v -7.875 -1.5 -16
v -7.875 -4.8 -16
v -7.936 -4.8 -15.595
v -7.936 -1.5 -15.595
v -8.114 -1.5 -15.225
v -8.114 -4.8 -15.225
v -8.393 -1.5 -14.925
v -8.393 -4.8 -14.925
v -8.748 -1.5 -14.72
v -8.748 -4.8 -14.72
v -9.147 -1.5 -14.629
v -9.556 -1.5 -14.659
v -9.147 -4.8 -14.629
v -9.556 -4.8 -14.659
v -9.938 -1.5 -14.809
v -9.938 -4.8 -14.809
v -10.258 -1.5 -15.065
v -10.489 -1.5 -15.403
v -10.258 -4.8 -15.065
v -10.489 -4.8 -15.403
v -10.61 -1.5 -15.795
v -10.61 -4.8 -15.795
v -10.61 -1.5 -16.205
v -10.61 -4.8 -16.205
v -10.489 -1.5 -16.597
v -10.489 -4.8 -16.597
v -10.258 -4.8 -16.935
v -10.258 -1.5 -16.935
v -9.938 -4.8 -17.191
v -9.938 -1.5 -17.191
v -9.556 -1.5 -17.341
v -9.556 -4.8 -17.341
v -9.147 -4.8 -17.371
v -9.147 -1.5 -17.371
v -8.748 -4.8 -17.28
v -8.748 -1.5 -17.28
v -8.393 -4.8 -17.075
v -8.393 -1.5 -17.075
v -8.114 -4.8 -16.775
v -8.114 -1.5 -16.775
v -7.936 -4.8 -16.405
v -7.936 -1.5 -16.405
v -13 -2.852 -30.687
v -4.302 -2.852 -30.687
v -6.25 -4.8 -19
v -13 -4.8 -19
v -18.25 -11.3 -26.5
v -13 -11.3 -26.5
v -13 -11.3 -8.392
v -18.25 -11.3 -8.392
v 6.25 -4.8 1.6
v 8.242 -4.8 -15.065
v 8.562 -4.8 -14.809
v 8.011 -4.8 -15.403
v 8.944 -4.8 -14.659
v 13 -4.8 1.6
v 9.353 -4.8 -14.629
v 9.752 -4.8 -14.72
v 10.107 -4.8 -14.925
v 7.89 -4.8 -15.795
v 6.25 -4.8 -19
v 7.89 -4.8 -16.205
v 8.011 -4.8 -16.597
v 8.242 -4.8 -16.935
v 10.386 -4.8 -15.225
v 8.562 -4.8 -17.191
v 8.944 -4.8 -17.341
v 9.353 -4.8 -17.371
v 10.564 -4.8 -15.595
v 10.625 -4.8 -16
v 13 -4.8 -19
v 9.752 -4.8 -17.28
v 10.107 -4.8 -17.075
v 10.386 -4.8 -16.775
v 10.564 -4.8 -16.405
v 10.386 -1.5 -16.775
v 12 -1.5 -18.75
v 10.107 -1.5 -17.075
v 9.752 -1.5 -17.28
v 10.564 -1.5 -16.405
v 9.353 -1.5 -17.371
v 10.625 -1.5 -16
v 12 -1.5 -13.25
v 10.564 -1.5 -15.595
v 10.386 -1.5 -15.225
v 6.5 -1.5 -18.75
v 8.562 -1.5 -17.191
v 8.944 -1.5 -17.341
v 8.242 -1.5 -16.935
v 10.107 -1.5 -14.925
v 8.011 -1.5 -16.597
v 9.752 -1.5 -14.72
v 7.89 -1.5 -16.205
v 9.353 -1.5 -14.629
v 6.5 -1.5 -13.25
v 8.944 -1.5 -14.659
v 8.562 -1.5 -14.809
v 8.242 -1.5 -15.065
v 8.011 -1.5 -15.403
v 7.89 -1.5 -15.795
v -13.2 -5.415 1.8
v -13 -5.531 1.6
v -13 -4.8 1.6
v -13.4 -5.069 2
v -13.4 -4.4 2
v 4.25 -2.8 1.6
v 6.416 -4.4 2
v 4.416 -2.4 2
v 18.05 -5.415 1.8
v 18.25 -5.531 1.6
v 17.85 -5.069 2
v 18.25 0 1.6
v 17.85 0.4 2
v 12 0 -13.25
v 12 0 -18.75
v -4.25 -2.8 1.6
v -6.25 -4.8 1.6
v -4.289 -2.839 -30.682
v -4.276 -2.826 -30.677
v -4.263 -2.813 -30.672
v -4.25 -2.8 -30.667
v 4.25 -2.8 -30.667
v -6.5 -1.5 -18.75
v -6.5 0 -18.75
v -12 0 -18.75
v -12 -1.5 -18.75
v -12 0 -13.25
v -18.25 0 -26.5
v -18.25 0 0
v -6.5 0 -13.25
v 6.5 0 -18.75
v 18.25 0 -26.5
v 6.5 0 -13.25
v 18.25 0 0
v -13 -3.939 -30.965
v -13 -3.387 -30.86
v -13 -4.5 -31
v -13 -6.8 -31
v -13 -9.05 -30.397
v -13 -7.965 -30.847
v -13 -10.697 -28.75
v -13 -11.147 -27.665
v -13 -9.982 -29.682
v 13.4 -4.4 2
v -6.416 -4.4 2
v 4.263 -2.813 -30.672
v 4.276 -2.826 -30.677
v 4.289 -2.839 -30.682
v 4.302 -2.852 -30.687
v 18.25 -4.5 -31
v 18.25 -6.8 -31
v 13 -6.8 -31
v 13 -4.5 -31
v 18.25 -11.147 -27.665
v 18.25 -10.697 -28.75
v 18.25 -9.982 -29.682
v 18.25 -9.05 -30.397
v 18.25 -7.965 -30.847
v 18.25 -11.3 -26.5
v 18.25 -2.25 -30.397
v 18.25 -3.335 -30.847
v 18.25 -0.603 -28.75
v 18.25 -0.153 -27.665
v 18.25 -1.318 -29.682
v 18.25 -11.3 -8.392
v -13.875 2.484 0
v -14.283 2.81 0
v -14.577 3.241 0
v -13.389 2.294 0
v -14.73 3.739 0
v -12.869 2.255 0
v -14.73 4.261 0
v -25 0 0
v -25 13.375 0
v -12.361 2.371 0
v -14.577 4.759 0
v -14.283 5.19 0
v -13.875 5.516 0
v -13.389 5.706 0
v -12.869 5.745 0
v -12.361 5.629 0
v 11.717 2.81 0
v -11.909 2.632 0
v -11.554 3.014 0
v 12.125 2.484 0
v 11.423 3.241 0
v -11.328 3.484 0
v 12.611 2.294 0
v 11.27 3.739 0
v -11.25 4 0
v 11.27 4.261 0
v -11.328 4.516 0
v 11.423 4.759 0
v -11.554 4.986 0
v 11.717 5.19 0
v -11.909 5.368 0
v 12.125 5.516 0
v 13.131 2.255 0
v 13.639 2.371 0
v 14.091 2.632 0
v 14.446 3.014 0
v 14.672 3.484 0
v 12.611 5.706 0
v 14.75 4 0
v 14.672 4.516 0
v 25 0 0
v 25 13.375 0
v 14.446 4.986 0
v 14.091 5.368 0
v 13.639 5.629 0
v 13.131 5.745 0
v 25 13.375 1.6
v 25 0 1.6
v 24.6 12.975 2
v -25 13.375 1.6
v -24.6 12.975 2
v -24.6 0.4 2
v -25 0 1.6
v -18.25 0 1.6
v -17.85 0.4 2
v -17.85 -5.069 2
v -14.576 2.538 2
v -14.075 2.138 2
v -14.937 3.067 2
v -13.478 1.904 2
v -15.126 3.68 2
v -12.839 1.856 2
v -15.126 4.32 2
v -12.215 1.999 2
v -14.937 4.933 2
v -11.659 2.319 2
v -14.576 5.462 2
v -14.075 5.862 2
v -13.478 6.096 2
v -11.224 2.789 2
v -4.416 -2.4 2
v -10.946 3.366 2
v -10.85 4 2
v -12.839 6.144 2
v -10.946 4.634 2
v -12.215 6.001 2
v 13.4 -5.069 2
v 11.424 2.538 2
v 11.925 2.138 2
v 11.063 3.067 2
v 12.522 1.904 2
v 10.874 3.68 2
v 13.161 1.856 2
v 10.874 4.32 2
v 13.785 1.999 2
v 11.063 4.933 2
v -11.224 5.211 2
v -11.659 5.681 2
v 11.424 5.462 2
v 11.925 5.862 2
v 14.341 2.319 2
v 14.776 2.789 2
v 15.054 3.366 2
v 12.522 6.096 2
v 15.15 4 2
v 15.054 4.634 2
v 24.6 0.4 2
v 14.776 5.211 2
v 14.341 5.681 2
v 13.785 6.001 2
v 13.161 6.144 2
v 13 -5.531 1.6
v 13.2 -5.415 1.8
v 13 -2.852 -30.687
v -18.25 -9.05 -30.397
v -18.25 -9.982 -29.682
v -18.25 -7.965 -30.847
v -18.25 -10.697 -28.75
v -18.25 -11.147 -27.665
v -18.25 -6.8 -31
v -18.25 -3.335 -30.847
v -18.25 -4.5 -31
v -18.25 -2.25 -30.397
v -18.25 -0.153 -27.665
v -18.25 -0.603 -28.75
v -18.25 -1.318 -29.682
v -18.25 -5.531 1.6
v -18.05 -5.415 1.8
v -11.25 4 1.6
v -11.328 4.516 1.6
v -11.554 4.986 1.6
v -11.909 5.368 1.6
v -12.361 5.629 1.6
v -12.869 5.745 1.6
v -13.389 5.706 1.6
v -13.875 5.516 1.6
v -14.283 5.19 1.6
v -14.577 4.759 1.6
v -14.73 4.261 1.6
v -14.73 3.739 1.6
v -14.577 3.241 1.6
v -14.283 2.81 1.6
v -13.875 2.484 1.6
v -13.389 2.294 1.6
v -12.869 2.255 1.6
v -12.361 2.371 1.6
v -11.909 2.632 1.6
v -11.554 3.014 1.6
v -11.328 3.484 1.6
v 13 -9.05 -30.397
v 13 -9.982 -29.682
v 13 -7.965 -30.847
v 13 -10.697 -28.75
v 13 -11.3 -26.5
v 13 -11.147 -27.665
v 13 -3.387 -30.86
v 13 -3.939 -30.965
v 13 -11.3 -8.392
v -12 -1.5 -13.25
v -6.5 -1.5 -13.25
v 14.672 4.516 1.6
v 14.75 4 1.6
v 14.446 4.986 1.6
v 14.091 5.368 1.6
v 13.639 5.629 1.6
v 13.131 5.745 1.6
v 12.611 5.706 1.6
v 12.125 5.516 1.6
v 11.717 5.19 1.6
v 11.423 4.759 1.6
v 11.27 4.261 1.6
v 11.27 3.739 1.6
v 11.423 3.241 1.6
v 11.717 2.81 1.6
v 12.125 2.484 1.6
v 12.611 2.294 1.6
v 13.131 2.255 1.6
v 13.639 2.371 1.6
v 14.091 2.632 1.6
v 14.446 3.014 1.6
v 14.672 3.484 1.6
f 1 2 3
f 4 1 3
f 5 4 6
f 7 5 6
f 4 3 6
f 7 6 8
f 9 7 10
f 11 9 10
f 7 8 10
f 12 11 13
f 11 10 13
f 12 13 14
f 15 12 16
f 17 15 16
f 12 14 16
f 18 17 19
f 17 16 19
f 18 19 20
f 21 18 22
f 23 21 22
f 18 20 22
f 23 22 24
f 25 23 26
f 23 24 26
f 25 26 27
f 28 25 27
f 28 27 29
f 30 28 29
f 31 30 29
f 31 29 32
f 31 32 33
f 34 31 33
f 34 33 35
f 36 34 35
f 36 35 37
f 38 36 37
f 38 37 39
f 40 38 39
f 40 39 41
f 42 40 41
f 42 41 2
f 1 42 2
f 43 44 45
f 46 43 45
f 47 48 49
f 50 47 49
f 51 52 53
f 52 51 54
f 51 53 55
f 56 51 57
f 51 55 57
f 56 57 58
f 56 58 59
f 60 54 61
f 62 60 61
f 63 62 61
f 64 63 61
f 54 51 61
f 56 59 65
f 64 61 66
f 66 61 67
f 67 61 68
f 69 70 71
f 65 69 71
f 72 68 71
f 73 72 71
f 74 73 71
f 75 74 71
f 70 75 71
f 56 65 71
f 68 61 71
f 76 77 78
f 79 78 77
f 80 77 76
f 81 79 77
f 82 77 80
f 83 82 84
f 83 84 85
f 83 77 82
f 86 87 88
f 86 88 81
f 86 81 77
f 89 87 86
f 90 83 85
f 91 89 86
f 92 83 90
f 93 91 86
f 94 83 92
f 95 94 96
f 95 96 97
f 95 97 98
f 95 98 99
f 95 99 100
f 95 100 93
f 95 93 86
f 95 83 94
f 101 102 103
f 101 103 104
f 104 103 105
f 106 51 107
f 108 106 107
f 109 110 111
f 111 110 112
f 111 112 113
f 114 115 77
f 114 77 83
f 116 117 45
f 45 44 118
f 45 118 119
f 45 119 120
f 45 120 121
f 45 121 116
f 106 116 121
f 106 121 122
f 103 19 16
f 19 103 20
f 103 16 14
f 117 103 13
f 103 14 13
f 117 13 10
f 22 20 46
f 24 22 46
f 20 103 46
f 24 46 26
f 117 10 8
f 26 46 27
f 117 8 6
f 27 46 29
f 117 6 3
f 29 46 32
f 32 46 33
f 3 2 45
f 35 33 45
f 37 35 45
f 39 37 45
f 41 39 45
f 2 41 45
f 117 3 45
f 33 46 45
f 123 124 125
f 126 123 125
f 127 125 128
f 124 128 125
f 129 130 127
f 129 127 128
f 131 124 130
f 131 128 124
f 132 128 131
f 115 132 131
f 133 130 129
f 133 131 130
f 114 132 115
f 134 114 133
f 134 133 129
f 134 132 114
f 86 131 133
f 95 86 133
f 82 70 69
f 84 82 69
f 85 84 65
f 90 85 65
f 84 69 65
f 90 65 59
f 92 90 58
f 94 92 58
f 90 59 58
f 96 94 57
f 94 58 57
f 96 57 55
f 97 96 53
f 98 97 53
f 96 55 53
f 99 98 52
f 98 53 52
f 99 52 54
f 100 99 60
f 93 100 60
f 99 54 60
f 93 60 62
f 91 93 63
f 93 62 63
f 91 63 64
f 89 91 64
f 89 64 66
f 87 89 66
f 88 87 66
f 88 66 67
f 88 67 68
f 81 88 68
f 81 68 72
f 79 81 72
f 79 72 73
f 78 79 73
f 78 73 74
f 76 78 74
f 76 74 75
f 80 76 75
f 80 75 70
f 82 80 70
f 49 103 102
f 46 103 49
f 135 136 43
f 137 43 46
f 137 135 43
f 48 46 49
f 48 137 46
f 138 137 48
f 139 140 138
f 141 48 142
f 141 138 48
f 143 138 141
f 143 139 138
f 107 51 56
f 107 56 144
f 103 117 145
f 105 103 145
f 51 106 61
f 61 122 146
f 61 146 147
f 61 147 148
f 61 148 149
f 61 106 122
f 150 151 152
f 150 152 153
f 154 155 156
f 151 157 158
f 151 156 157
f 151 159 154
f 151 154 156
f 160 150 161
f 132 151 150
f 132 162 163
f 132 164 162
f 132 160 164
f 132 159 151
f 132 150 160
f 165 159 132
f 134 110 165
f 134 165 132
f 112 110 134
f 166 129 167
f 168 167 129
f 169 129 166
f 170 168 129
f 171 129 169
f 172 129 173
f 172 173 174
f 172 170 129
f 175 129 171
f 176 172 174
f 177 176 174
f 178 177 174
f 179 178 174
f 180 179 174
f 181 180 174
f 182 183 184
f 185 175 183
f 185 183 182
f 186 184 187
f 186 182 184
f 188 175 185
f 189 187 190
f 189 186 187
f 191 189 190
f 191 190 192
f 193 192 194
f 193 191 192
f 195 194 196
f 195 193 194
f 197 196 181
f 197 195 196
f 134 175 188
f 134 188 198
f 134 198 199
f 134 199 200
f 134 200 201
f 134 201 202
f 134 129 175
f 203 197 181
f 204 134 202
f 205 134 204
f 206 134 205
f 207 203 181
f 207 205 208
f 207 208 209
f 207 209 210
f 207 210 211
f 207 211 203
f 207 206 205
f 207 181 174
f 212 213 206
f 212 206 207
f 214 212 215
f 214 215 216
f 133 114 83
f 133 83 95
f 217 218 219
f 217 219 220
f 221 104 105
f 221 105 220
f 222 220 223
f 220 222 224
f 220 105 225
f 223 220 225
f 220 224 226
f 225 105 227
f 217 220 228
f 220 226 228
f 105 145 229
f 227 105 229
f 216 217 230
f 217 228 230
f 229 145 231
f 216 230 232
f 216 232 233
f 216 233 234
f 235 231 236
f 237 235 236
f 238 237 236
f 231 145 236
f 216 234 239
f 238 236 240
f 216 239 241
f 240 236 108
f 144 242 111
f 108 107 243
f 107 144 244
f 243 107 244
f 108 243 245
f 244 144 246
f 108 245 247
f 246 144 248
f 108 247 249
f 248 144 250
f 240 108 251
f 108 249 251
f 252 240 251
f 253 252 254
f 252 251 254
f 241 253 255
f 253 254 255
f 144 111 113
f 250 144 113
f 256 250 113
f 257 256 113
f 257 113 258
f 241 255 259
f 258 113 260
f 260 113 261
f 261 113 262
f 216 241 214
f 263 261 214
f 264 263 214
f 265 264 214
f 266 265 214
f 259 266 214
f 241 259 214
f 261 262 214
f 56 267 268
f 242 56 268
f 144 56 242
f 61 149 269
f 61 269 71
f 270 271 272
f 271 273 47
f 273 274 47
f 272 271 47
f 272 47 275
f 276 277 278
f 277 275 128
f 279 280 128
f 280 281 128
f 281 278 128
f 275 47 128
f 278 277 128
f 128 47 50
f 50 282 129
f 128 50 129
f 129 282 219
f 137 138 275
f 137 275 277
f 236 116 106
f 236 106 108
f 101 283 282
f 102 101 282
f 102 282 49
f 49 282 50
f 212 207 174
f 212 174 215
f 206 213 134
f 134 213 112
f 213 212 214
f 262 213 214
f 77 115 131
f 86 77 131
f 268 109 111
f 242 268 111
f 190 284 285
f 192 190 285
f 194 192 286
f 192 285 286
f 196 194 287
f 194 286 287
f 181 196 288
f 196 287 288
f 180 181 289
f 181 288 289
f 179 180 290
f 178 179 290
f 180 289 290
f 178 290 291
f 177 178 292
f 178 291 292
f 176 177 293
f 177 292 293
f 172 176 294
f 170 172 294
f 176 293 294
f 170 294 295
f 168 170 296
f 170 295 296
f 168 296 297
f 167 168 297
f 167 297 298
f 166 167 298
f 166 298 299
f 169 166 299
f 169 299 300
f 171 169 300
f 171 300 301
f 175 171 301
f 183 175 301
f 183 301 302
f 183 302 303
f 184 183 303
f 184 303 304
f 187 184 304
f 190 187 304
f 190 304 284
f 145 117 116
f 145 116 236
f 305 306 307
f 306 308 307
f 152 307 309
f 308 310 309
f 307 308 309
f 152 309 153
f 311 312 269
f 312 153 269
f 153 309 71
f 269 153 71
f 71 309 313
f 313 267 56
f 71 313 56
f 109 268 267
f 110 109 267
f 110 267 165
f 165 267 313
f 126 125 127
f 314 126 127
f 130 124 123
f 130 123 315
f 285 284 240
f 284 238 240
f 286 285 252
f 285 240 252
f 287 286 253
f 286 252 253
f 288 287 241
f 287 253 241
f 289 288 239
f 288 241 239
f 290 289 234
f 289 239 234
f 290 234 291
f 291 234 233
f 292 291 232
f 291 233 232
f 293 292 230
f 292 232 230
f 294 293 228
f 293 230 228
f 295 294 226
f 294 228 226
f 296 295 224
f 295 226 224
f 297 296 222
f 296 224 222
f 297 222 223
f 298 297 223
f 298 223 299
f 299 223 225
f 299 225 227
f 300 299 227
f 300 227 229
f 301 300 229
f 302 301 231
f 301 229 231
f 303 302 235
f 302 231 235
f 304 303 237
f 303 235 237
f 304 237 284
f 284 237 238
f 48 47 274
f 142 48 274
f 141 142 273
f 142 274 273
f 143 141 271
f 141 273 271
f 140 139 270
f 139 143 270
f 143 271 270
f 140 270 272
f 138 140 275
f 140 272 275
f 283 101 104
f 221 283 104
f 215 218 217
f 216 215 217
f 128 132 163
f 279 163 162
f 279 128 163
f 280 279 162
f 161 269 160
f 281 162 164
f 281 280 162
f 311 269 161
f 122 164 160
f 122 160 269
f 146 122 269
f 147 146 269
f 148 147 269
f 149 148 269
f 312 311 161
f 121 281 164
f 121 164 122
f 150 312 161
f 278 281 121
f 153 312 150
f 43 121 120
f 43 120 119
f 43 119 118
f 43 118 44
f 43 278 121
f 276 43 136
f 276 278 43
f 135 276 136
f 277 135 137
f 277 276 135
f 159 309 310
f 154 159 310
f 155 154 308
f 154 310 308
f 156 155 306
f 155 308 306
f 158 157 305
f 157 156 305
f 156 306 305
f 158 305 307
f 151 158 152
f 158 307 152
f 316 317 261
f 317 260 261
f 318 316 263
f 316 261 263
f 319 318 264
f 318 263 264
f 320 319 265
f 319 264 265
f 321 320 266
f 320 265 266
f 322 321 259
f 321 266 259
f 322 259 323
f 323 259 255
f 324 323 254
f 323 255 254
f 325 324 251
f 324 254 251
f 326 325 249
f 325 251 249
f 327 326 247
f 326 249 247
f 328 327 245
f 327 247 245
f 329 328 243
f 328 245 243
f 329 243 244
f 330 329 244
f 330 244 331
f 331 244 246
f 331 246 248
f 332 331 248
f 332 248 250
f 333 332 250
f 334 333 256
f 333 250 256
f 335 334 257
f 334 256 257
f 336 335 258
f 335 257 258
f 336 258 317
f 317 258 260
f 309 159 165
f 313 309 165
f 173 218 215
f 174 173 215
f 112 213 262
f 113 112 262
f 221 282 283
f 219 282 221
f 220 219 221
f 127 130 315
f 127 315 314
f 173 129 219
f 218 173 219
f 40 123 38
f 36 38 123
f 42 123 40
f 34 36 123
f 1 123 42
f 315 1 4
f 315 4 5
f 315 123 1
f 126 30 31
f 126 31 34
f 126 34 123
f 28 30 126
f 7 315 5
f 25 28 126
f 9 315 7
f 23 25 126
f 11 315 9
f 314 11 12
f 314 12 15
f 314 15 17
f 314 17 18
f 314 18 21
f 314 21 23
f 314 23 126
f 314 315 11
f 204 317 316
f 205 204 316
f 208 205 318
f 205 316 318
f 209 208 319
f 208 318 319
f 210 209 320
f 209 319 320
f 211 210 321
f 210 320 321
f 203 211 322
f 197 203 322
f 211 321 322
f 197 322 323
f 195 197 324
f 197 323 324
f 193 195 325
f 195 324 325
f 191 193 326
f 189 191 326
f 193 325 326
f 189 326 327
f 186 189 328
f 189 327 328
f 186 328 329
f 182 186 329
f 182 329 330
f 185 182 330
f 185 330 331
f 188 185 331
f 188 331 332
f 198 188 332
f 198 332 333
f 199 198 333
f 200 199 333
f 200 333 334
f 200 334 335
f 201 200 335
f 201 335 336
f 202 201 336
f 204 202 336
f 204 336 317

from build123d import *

# Parameters (mm, degrees)
F0_W           = 13.375
F0_H           = 2
F1_DEPTH       = 25
F2_R           = 1.75
F3_DEPTH       = 2
F4_W           = 11.3
F4_H           = 33
F5_DEPTH       = 18.25
F6_W           = 26
F6_H           = 6.5
F7_DEPTH       = 33
F9_DEPTH       = 33
F11_DEPTH      = 13
F11_DEPTH_BACK = 13
F12_R          = 1.375
F13_DEPTH      = 4.8
F14_W          = 5.5
F14_H          = 5.5
F15_DEPTH      = 1.5
F16_T1_DEPTH   = 27.75
F16_T3_DEPTH   = 27.75
F16_T5_DEPTH   = 59
F17_T1_DEPTH   = 59.021567647
F17_T3_DEPTH   = 59.021567647
F18_T1_DEPTH   = 15.4323463904
F18_T3_DEPTH   = 52.0573463904
F18_T5_DEPTH   = 7.7786731952
F18_T7_DEPTH   = 6.3286731952
F18_T9_DEPTH   = 6.4746360003
F18_T11_DEPTH  = 1.5286731952
F18_T13_DEPTH  = 7.7786731952
F18_T15_DEPTH  = 7.7786731952
F18_T17_DEPTH  = 6.4746360003
F18_T19_DEPTH  = 7.7786731952
F18_T24_DEPTH  = 4.8857735151
F18_T29_DEPTH  = 10.5573463904
F18_T35_DEPTH  = 4.8857735151
F18_T45_DEPTH  = 7.7786731952
F18_T49_DEPTH  = 7.3573463904
F18_T56_DEPTH  = 2.5573463904
F18_T60_DEPTH  = 8.8073463904
F18_T67_DEPTH  = 10.5573463904
F18_T71_DEPTH  = 4.8857735151
F18_T78_DEPTH  = 4.8857735151
F18_T82_DEPTH  = 10.5573463904
F18_T89_DEPTH  = 2.5573463904
F18_T93_DEPTH  = 8.8073463904
F18_T100_DEPTH = 7.7786731952
F18_T104_DEPTH = 7.3573463904


# Not quite as in the source:
# - a fillet or chamfer that OpenCascade refuses, or shapes differently, is made with other operations: its cross-section is extruded or revolved along the edge and cut away or added


with BuildPart() as f1:
    # F0 (on Right) → F1 (new body, symmetric)
    with BuildSketch(Plane.YZ):
        with Locations((6.6875, 1)):
            Rectangle(F0_W, F0_H)
    extrude(amount=F1_DEPTH, both=True)

    # F2 (on face) → F3 (cut, through all)
    with BuildSketch(Plane.XY.offset(2)):
        with Locations((-13, 4)):
            Circle(F2_R)
        with Locations((13, 4)):
            Circle(F2_R)
    extrude(amount=-F3_DEPTH, mode=Mode.SUBTRACT)

    # F4 (on Right) → F5 (join, symmetric)
    with BuildSketch(Plane.YZ):
        with Locations((-5.65, -14.5)):
            Rectangle(F4_W, F4_H)
    extrude(amount=F5_DEPTH, both=True)

    # F6 (on face) → F7 (cut, through all)
    with BuildSketch(Plane(origin=(0, 0, -31), x_dir=(1, 0, 0), z_dir=(0, 0, -1))):
        with Locations((0, 8.05)):
            Rectangle(F6_W, F6_H)
    extrude(amount=-F7_DEPTH, mode=Mode.SUBTRACT)

    # F8 (on face) → F9 (cut, through all)
    with BuildSketch(Plane(origin=(0, 0, -31), x_dir=(1, 0, 0), z_dir=(0, 0, -1))):
        Polygon((6.25, 4.8), (-6.25, 4.8), (-4.25, 2.8), (4.25, 2.8), align=None)
    extrude(amount=-F9_DEPTH, mode=Mode.SUBTRACT)

    # F10 (on Right) → F11 (cut, two sides)
    with BuildSketch(Plane.YZ) as f11_sk:
        Polygon((-4.8, -31), (-2.8, -31), (-4.8, -19), align=None)
    extrude(amount=F11_DEPTH, mode=Mode.SUBTRACT)
    extrude(f11_sk.sketch, amount=-F11_DEPTH_BACK, mode=Mode.SUBTRACT)

    # F12 (on face) → F13 (cut, through all)
    with BuildSketch(Plane.XZ.offset(4.8)):
        with Locations((-9.25, -16)):
            Circle(F12_R)
        with Locations((9.25, -16)):
            Circle(F12_R)
    extrude(amount=-F13_DEPTH, mode=Mode.SUBTRACT)

    # F14 (on face) → F15 (cut)
    with BuildSketch(Plane(origin=(0, 0, 0), x_dir=(-1, 0, 0), z_dir=(0, 1, 0))):
        with Locations((-9.25, -16)):
            Rectangle(F14_W, F14_H)
        with Locations((9.25, -16)):
            Rectangle(F14_W, F14_H)
    extrude(amount=-F15_DEPTH, mode=Mode.SUBTRACT)

    # F16: fillet of radius 4.5 on 3 edges, made by hand

    # F16_s2 → F16_t1 (cut)
    with BuildSketch(Plane.YZ.offset(-29.5)):
        with BuildLine():
            ThreePointArc((-11.3, -26.5), (-9.9819805153, -29.6819805153), (-6.8, -31))
            Line((-6.8, -31), (-11.3, -31))
            Line((-11.3, -31), (-11.3, -26.5))
        make_face()
    extrude(amount=F16_T1_DEPTH, mode=Mode.SUBTRACT)

    # F16_s4 → F16_t3 (cut)
    with BuildSketch(Plane.YZ.offset(1.75)):
        with BuildLine():
            ThreePointArc((-11.3, -26.5), (-9.9819805153, -29.6819805153), (-6.8, -31))
            Line((-6.8, -31), (-11.3, -31))
            Line((-11.3, -31), (-11.3, -26.5))
        make_face()
    extrude(amount=F16_T3_DEPTH, mode=Mode.SUBTRACT)

    # F16_s6 → F16_t5 (cut)
    with BuildSketch(Plane.YZ.offset(-29.5)):
        with BuildLine():
            ThreePointArc((0, -26.5), (-1.3180194847, -29.6819805153), (-4.5, -31))
            Line((-4.5, -31), (0, -31))
            Line((0, -31), (0, -26.5))
        make_face()
    extrude(amount=F16_T5_DEPTH, mode=Mode.SUBTRACT)

    # F17: chamfer of 6 x 10.3923048454 on 2 edges, made by hand

    # F17_s2 → F17_t1 (cut)
    with BuildSketch(Plane.YZ.offset(-45.1357838235)):
        Polygon((-5.3, 2), (-11.3, -8.3923048454), (-11.3, 2), align=None)
    extrude(amount=F17_T1_DEPTH, mode=Mode.SUBTRACT)

    # F17_s4 → F17_t3 (cut)
    with BuildSketch(Plane.YZ.offset(-13.8857838235)):
        Polygon((-5.3, 2), (-11.3, -8.3923048454), (-11.3, 2), align=None)
    extrude(amount=F17_T3_DEPTH, mode=Mode.SUBTRACT)

    # F18: chamfer of 0.4 on 18 edges, made by hand

    # F18_s2 → F18_t1 (cut)
    with BuildSketch(Plane.XZ.offset(-14.4036731952)):
        Polygon((25, 1.6), (24.6, 2), (25, 2), align=None)
        Polygon((-25, 1.6), (-24.6, 2), (-25, 2), align=None)
    extrude(amount=F18_T1_DEPTH, mode=Mode.SUBTRACT)

    # F18_s4 → F18_t3 (cut)
    with BuildSketch(Plane.YZ.offset(-26.0286731952)):
        Polygon((13.375, 1.6), (12.975, 2), (13.375, 2), align=None)
    extrude(amount=F18_T3_DEPTH, mode=Mode.SUBTRACT)

    # F18_s6 → F18_t5 (cut)
    with BuildSketch(Plane.YZ.offset(-26.0286731952)):
        Polygon((0, 1.6), (0.4, 2), (0, 2), align=None)
    extrude(amount=F18_T5_DEPTH, mode=Mode.SUBTRACT)

    # F18_s8 → F18_t7 (cut)
    with BuildSketch(Plane.XZ):
        Polygon((-18.25, 1.6), (-17.85, 2), (-18.25, 2), align=None)
        Polygon((18.25, 1.6), (17.85, 2), (18.25, 2), align=None)
    extrude(amount=F18_T7_DEPTH, mode=Mode.SUBTRACT)

    # F18_s10 → F18_t9 (cut)
    with BuildSketch(Plane.YZ.offset(-18.8623180002)):
        Polygon((-5.4154700538, 1.8), (-5.0690598923, 2), (-5.3, 2), align=None)
    extrude(amount=F18_T9_DEPTH, mode=Mode.SUBTRACT)

    # F18_s12 → F18_t11 (cut)
    with BuildSketch(Plane.XZ.offset(4.8)):
        Polygon((-13, 1.6), (-13.4, 2), (-13, 2), align=None)
        Polygon((13, 1.6), (13.4, 2), (13, 2), align=None)
    extrude(amount=F18_T11_DEPTH, mode=Mode.SUBTRACT)

    # F18_s14 → F18_t13 (cut)
    with BuildSketch(Plane.YZ.offset(-13)):
        Polygon((-4.8, 1.6), (-4.4, 2), (-4.8, 2), align=None)
    extrude(amount=F18_T13_DEPTH, mode=Mode.SUBTRACT)

    # F18_s16 → F18_t15 (cut)
    with BuildSketch(Plane.YZ.offset(5.2213268048)):
        Polygon((-4.8, 1.6), (-4.4, 2), (-4.8, 2), align=None)
    extrude(amount=F18_T15_DEPTH, mode=Mode.SUBTRACT)

    # F18_s18 → F18_t17 (cut)
    with BuildSketch(Plane.YZ.offset(12.3876819998)):
        Polygon((-5.4154700538, 1.8), (-5.0690598923, 2), (-5.3, 2), align=None)
    extrude(amount=F18_T17_DEPTH, mode=Mode.SUBTRACT)

    # F18_s20 → F18_t19 (cut)
    with BuildSketch(Plane.YZ.offset(18.25)):
        Polygon((0, 1.6), (0.4, 2), (0, 2), align=None)
    extrude(amount=F18_T19_DEPTH, mode=Mode.SUBTRACT)


with BuildPart() as f18_tool22:
    # F18_s23 → F18_t24 (new body)
    with BuildSketch(Plane(origin=(-6.2523817919, -6.2523817919, 0), x_dir=(0, 0, 1), z_dir=(0.7071067812, 0.7071067812, 0))):
        Polygon((1.6, -1.0253048327), (2, -1.4253048327), (2, -1.0253048327), align=None)
    extrude(amount=F18_T24_DEPTH)

    split(bisect_by=Plane.XZ.offset(2.8), keep=Keep.TOP)


with BuildPart() as f1_1:
    add(f1.part)

    # F18_t21: cut F18_tool22
    add(f18_tool22.part, mode=Mode.SUBTRACT)


with BuildPart() as f18_tool27:
    # F18_s28 → F18_t29 (new body)
    with BuildSketch(Plane.YZ.offset(-5.2786731952)):
        Polygon((-2.8, 1.6), (-2.4, 2), (-2.8, 2), align=None)
    extrude(amount=F18_T29_DEPTH)

    split(bisect_by=Plane(origin=(0.725, 0.725, 0), x_dir=(0, 0, 1), z_dir=(-0.7071067812, -0.7071067812, 0)), keep=Keep.TOP)

    split(bisect_by=Plane(origin=(-0.725, 0.725, 0), x_dir=(0, 0, 1), z_dir=(0.7071067812, -0.7071067812, 0)), keep=Keep.TOP)


with BuildPart() as f1_2:
    add(f1_1.part)

    # F18_t26: cut F18_tool27
    add(f18_tool27.part, mode=Mode.SUBTRACT)


with BuildPart() as f18_tool33:
    # F18_s34 → F18_t35 (new body)
    with BuildSketch(Plane(origin=(2.7976182081, -2.7976182081, 0), x_dir=(0, 0, 1), z_dir=(0.7071067812, -0.7071067812, 0))):
        Polygon((1.6, -1.0253048327), (2, -1.4253048327), (2, -1.0253048327), align=None)
    extrude(amount=F18_T35_DEPTH)

    split(bisect_by=Plane.XZ.offset(2.8), keep=Keep.TOP)


with BuildPart() as f1_3:
    add(f1_2.part)

    # F18_t32: cut F18_tool33
    add(f18_tool33.part, mode=Mode.SUBTRACT)

    # F18_s37 → F18_t38 (revolve, cut)
    with BuildSketch(Plane.XZ.offset(-4)):
        Polygon((-11.25, 1.6), (-10.85, 2), (-11.25, 2), align=None)
    revolve(axis=Axis((-13, 4, 2), (0, 0, 1)), mode=Mode.SUBTRACT)

    # F18_s39 → F18_t40 (revolve, cut)
    with BuildSketch(Plane.XZ.offset(-4)):
        Polygon((14.75, 1.6), (15.15, 2), (14.75, 2), align=None)
    revolve(axis=Axis((13, 4, 2), (0, 0, 1)), mode=Mode.SUBTRACT)


with BuildPart() as f18_tool43:
    # F18_s44 → F18_t45 (new body)
    with BuildSketch(Plane.YZ.offset(-17.2213268048)):
        Polygon((0, 1.6), (0.4, 2), (0, 2), align=None)
    extrude(amount=-F18_T45_DEPTH)

    split(bisect_by=Plane.YZ.offset(-18.25), keep=Keep.TOP)


with BuildPart() as f18_tool47:
    # F18_s48 → F18_t49 (new body)
    with BuildSketch(Plane.XZ.offset(-1.0286731952)):
        Polygon((-18.25, 1.6), (-17.85, 2), (-18.25, 2), align=None)
    extrude(amount=F18_T49_DEPTH)

    split(bisect_by=Plane.XZ, keep=Keep.BOTTOM)


with BuildPart() as f18_tool43_1:
    add(f18_tool43.part)

    # F18_t51: intersect F18_tool47
    add(f18_tool47.part, mode=Mode.INTERSECT)


with BuildPart() as f1_4:
    add(f1_3.part)

    # F18_t41: cut F18_tool43
    add(f18_tool43_1.part, mode=Mode.SUBTRACT)


with BuildPart() as f18_tool54:
    # F18_s55 → F18_t56 (new body)
    with BuildSketch(Plane.XZ.offset(6.3286731952)):
        Polygon((-13, 1.6), (-13.4, 2), (-13, 2), align=None)
    extrude(amount=-F18_T56_DEPTH)

    split(bisect_by=Plane.XZ.offset(4.8), keep=Keep.BOTTOM)


with BuildPart() as f18_tool58:
    # F18_s59 → F18_t60 (new body)
    with BuildSketch(Plane.YZ.offset(-14.0286731952)):
        Polygon((-4.8, 1.6), (-4.4, 2), (-4.8, 2), align=None)
    extrude(amount=F18_T60_DEPTH)

    split(bisect_by=Plane.YZ.offset(-13), keep=Keep.BOTTOM)


with BuildPart() as f18_tool54_1:
    add(f18_tool54.part)

    # F18_t62: intersect F18_tool58
    add(f18_tool58.part, mode=Mode.INTERSECT)


with BuildPart() as f1_5:
    add(f1_4.part)

    # F18_t52: cut F18_tool54
    add(f18_tool54_1.part, mode=Mode.SUBTRACT)


with BuildPart() as f18_tool65:
    # F18_s66 → F18_t67 (new body)
    with BuildSketch(Plane.YZ.offset(-5.2786731952)):
        Polygon((-2.8, 1.6), (-2.4, 2), (-2.8, 2), align=None)
    extrude(amount=F18_T67_DEPTH)

    split(bisect_by=Plane(origin=(-0.725, 0.725, 0), x_dir=(0, 0, 1), z_dir=(-0.7071067812, 0.7071067812, 0)), keep=Keep.TOP)


with BuildPart() as f18_tool69:
    # F18_s70 → F18_t71 (new body)
    with BuildSketch(Plane(origin=(-6.2523817919, -6.2523817919, 0), x_dir=(0, 0, 1), z_dir=(0.7071067812, 0.7071067812, 0))):
        Polygon((1.6, -1.0253048327), (2, -1.4253048327), (2, -1.0253048327), align=None)
    extrude(amount=F18_T71_DEPTH)

    split(bisect_by=Plane.XZ.offset(2.8), keep=Keep.BOTTOM)


with BuildPart() as f18_tool65_1:
    add(f18_tool65.part)

    # F18_t73: intersect F18_tool69
    add(f18_tool69.part, mode=Mode.INTERSECT)


with BuildPart() as f1_6:
    add(f1_5.part)

    # F18_t63: cut F18_tool65
    add(f18_tool65_1.part, mode=Mode.SUBTRACT)


with BuildPart() as f18_tool76:
    # F18_s77 → F18_t78 (new body)
    with BuildSketch(Plane(origin=(2.7976182081, -2.7976182081, 0), x_dir=(0, 0, 1), z_dir=(0.7071067812, -0.7071067812, 0))):
        Polygon((1.6, -1.0253048327), (2, -1.4253048327), (2, -1.0253048327), align=None)
    extrude(amount=F18_T78_DEPTH)

    split(bisect_by=Plane.XZ.offset(2.8), keep=Keep.BOTTOM)


with BuildPart() as f18_tool80:
    # F18_s81 → F18_t82 (new body)
    with BuildSketch(Plane.YZ.offset(-5.2786731952)):
        Polygon((-2.8, 1.6), (-2.4, 2), (-2.8, 2), align=None)
    extrude(amount=F18_T82_DEPTH)

    split(bisect_by=Plane(origin=(0.725, 0.725, 0), x_dir=(0, 0, 1), z_dir=(0.7071067812, 0.7071067812, 0)), keep=Keep.TOP)


with BuildPart() as f18_tool76_1:
    add(f18_tool76.part)

    # F18_t84: intersect F18_tool80
    add(f18_tool80.part, mode=Mode.INTERSECT)


with BuildPart() as f1_7:
    add(f1_6.part)

    # F18_t74: cut F18_tool76
    add(f18_tool76_1.part, mode=Mode.SUBTRACT)


with BuildPart() as f18_tool87:
    # F18_s88 → F18_t89 (new body)
    with BuildSketch(Plane.XZ.offset(3.7713268048)):
        Polygon((13, 1.6), (13.4, 2), (13, 2), align=None)
    extrude(amount=F18_T89_DEPTH)

    split(bisect_by=Plane.XZ.offset(4.8), keep=Keep.BOTTOM)


with BuildPart() as f18_tool91:
    # F18_s92 → F18_t93 (new body)
    with BuildSketch(Plane.YZ.offset(5.2213268048)):
        Polygon((-4.8, 1.6), (-4.4, 2), (-4.8, 2), align=None)
    extrude(amount=F18_T93_DEPTH)

    split(bisect_by=Plane.YZ.offset(13), keep=Keep.TOP)


with BuildPart() as f18_tool87_1:
    add(f18_tool87.part)

    # F18_t95: intersect F18_tool91
    add(f18_tool91.part, mode=Mode.INTERSECT)


with BuildPart() as f1_8:
    add(f1_7.part)

    # F18_t85: cut F18_tool87
    add(f18_tool87_1.part, mode=Mode.SUBTRACT)


with BuildPart() as f18_tool98:
    # F18_s99 → F18_t100 (new body)
    with BuildSketch(Plane.YZ.offset(25)):
        Polygon((0, 1.6), (0.4, 2), (0, 2), align=None)
    extrude(amount=-F18_T100_DEPTH)

    split(bisect_by=Plane.YZ.offset(18.25), keep=Keep.BOTTOM)


with BuildPart() as f18_tool102:
    # F18_s103 → F18_t104 (new body)
    with BuildSketch(Plane.XZ.offset(-1.0286731952)):
        Polygon((18.25, 1.6), (17.85, 2), (18.25, 2), align=None)
    extrude(amount=F18_T104_DEPTH)

    split(bisect_by=Plane.XZ, keep=Keep.BOTTOM)


with BuildPart() as f18_tool98_1:
    add(f18_tool98.part)

    # F18_t106: intersect F18_tool102
    add(f18_tool102.part, mode=Mode.INTERSECT)


with BuildPart() as f1_9:
    add(f1_8.part)

    # F18_t96: cut F18_tool98
    add(f18_tool98_1.part, mode=Mode.SUBTRACT)


solid = f1_9.part
